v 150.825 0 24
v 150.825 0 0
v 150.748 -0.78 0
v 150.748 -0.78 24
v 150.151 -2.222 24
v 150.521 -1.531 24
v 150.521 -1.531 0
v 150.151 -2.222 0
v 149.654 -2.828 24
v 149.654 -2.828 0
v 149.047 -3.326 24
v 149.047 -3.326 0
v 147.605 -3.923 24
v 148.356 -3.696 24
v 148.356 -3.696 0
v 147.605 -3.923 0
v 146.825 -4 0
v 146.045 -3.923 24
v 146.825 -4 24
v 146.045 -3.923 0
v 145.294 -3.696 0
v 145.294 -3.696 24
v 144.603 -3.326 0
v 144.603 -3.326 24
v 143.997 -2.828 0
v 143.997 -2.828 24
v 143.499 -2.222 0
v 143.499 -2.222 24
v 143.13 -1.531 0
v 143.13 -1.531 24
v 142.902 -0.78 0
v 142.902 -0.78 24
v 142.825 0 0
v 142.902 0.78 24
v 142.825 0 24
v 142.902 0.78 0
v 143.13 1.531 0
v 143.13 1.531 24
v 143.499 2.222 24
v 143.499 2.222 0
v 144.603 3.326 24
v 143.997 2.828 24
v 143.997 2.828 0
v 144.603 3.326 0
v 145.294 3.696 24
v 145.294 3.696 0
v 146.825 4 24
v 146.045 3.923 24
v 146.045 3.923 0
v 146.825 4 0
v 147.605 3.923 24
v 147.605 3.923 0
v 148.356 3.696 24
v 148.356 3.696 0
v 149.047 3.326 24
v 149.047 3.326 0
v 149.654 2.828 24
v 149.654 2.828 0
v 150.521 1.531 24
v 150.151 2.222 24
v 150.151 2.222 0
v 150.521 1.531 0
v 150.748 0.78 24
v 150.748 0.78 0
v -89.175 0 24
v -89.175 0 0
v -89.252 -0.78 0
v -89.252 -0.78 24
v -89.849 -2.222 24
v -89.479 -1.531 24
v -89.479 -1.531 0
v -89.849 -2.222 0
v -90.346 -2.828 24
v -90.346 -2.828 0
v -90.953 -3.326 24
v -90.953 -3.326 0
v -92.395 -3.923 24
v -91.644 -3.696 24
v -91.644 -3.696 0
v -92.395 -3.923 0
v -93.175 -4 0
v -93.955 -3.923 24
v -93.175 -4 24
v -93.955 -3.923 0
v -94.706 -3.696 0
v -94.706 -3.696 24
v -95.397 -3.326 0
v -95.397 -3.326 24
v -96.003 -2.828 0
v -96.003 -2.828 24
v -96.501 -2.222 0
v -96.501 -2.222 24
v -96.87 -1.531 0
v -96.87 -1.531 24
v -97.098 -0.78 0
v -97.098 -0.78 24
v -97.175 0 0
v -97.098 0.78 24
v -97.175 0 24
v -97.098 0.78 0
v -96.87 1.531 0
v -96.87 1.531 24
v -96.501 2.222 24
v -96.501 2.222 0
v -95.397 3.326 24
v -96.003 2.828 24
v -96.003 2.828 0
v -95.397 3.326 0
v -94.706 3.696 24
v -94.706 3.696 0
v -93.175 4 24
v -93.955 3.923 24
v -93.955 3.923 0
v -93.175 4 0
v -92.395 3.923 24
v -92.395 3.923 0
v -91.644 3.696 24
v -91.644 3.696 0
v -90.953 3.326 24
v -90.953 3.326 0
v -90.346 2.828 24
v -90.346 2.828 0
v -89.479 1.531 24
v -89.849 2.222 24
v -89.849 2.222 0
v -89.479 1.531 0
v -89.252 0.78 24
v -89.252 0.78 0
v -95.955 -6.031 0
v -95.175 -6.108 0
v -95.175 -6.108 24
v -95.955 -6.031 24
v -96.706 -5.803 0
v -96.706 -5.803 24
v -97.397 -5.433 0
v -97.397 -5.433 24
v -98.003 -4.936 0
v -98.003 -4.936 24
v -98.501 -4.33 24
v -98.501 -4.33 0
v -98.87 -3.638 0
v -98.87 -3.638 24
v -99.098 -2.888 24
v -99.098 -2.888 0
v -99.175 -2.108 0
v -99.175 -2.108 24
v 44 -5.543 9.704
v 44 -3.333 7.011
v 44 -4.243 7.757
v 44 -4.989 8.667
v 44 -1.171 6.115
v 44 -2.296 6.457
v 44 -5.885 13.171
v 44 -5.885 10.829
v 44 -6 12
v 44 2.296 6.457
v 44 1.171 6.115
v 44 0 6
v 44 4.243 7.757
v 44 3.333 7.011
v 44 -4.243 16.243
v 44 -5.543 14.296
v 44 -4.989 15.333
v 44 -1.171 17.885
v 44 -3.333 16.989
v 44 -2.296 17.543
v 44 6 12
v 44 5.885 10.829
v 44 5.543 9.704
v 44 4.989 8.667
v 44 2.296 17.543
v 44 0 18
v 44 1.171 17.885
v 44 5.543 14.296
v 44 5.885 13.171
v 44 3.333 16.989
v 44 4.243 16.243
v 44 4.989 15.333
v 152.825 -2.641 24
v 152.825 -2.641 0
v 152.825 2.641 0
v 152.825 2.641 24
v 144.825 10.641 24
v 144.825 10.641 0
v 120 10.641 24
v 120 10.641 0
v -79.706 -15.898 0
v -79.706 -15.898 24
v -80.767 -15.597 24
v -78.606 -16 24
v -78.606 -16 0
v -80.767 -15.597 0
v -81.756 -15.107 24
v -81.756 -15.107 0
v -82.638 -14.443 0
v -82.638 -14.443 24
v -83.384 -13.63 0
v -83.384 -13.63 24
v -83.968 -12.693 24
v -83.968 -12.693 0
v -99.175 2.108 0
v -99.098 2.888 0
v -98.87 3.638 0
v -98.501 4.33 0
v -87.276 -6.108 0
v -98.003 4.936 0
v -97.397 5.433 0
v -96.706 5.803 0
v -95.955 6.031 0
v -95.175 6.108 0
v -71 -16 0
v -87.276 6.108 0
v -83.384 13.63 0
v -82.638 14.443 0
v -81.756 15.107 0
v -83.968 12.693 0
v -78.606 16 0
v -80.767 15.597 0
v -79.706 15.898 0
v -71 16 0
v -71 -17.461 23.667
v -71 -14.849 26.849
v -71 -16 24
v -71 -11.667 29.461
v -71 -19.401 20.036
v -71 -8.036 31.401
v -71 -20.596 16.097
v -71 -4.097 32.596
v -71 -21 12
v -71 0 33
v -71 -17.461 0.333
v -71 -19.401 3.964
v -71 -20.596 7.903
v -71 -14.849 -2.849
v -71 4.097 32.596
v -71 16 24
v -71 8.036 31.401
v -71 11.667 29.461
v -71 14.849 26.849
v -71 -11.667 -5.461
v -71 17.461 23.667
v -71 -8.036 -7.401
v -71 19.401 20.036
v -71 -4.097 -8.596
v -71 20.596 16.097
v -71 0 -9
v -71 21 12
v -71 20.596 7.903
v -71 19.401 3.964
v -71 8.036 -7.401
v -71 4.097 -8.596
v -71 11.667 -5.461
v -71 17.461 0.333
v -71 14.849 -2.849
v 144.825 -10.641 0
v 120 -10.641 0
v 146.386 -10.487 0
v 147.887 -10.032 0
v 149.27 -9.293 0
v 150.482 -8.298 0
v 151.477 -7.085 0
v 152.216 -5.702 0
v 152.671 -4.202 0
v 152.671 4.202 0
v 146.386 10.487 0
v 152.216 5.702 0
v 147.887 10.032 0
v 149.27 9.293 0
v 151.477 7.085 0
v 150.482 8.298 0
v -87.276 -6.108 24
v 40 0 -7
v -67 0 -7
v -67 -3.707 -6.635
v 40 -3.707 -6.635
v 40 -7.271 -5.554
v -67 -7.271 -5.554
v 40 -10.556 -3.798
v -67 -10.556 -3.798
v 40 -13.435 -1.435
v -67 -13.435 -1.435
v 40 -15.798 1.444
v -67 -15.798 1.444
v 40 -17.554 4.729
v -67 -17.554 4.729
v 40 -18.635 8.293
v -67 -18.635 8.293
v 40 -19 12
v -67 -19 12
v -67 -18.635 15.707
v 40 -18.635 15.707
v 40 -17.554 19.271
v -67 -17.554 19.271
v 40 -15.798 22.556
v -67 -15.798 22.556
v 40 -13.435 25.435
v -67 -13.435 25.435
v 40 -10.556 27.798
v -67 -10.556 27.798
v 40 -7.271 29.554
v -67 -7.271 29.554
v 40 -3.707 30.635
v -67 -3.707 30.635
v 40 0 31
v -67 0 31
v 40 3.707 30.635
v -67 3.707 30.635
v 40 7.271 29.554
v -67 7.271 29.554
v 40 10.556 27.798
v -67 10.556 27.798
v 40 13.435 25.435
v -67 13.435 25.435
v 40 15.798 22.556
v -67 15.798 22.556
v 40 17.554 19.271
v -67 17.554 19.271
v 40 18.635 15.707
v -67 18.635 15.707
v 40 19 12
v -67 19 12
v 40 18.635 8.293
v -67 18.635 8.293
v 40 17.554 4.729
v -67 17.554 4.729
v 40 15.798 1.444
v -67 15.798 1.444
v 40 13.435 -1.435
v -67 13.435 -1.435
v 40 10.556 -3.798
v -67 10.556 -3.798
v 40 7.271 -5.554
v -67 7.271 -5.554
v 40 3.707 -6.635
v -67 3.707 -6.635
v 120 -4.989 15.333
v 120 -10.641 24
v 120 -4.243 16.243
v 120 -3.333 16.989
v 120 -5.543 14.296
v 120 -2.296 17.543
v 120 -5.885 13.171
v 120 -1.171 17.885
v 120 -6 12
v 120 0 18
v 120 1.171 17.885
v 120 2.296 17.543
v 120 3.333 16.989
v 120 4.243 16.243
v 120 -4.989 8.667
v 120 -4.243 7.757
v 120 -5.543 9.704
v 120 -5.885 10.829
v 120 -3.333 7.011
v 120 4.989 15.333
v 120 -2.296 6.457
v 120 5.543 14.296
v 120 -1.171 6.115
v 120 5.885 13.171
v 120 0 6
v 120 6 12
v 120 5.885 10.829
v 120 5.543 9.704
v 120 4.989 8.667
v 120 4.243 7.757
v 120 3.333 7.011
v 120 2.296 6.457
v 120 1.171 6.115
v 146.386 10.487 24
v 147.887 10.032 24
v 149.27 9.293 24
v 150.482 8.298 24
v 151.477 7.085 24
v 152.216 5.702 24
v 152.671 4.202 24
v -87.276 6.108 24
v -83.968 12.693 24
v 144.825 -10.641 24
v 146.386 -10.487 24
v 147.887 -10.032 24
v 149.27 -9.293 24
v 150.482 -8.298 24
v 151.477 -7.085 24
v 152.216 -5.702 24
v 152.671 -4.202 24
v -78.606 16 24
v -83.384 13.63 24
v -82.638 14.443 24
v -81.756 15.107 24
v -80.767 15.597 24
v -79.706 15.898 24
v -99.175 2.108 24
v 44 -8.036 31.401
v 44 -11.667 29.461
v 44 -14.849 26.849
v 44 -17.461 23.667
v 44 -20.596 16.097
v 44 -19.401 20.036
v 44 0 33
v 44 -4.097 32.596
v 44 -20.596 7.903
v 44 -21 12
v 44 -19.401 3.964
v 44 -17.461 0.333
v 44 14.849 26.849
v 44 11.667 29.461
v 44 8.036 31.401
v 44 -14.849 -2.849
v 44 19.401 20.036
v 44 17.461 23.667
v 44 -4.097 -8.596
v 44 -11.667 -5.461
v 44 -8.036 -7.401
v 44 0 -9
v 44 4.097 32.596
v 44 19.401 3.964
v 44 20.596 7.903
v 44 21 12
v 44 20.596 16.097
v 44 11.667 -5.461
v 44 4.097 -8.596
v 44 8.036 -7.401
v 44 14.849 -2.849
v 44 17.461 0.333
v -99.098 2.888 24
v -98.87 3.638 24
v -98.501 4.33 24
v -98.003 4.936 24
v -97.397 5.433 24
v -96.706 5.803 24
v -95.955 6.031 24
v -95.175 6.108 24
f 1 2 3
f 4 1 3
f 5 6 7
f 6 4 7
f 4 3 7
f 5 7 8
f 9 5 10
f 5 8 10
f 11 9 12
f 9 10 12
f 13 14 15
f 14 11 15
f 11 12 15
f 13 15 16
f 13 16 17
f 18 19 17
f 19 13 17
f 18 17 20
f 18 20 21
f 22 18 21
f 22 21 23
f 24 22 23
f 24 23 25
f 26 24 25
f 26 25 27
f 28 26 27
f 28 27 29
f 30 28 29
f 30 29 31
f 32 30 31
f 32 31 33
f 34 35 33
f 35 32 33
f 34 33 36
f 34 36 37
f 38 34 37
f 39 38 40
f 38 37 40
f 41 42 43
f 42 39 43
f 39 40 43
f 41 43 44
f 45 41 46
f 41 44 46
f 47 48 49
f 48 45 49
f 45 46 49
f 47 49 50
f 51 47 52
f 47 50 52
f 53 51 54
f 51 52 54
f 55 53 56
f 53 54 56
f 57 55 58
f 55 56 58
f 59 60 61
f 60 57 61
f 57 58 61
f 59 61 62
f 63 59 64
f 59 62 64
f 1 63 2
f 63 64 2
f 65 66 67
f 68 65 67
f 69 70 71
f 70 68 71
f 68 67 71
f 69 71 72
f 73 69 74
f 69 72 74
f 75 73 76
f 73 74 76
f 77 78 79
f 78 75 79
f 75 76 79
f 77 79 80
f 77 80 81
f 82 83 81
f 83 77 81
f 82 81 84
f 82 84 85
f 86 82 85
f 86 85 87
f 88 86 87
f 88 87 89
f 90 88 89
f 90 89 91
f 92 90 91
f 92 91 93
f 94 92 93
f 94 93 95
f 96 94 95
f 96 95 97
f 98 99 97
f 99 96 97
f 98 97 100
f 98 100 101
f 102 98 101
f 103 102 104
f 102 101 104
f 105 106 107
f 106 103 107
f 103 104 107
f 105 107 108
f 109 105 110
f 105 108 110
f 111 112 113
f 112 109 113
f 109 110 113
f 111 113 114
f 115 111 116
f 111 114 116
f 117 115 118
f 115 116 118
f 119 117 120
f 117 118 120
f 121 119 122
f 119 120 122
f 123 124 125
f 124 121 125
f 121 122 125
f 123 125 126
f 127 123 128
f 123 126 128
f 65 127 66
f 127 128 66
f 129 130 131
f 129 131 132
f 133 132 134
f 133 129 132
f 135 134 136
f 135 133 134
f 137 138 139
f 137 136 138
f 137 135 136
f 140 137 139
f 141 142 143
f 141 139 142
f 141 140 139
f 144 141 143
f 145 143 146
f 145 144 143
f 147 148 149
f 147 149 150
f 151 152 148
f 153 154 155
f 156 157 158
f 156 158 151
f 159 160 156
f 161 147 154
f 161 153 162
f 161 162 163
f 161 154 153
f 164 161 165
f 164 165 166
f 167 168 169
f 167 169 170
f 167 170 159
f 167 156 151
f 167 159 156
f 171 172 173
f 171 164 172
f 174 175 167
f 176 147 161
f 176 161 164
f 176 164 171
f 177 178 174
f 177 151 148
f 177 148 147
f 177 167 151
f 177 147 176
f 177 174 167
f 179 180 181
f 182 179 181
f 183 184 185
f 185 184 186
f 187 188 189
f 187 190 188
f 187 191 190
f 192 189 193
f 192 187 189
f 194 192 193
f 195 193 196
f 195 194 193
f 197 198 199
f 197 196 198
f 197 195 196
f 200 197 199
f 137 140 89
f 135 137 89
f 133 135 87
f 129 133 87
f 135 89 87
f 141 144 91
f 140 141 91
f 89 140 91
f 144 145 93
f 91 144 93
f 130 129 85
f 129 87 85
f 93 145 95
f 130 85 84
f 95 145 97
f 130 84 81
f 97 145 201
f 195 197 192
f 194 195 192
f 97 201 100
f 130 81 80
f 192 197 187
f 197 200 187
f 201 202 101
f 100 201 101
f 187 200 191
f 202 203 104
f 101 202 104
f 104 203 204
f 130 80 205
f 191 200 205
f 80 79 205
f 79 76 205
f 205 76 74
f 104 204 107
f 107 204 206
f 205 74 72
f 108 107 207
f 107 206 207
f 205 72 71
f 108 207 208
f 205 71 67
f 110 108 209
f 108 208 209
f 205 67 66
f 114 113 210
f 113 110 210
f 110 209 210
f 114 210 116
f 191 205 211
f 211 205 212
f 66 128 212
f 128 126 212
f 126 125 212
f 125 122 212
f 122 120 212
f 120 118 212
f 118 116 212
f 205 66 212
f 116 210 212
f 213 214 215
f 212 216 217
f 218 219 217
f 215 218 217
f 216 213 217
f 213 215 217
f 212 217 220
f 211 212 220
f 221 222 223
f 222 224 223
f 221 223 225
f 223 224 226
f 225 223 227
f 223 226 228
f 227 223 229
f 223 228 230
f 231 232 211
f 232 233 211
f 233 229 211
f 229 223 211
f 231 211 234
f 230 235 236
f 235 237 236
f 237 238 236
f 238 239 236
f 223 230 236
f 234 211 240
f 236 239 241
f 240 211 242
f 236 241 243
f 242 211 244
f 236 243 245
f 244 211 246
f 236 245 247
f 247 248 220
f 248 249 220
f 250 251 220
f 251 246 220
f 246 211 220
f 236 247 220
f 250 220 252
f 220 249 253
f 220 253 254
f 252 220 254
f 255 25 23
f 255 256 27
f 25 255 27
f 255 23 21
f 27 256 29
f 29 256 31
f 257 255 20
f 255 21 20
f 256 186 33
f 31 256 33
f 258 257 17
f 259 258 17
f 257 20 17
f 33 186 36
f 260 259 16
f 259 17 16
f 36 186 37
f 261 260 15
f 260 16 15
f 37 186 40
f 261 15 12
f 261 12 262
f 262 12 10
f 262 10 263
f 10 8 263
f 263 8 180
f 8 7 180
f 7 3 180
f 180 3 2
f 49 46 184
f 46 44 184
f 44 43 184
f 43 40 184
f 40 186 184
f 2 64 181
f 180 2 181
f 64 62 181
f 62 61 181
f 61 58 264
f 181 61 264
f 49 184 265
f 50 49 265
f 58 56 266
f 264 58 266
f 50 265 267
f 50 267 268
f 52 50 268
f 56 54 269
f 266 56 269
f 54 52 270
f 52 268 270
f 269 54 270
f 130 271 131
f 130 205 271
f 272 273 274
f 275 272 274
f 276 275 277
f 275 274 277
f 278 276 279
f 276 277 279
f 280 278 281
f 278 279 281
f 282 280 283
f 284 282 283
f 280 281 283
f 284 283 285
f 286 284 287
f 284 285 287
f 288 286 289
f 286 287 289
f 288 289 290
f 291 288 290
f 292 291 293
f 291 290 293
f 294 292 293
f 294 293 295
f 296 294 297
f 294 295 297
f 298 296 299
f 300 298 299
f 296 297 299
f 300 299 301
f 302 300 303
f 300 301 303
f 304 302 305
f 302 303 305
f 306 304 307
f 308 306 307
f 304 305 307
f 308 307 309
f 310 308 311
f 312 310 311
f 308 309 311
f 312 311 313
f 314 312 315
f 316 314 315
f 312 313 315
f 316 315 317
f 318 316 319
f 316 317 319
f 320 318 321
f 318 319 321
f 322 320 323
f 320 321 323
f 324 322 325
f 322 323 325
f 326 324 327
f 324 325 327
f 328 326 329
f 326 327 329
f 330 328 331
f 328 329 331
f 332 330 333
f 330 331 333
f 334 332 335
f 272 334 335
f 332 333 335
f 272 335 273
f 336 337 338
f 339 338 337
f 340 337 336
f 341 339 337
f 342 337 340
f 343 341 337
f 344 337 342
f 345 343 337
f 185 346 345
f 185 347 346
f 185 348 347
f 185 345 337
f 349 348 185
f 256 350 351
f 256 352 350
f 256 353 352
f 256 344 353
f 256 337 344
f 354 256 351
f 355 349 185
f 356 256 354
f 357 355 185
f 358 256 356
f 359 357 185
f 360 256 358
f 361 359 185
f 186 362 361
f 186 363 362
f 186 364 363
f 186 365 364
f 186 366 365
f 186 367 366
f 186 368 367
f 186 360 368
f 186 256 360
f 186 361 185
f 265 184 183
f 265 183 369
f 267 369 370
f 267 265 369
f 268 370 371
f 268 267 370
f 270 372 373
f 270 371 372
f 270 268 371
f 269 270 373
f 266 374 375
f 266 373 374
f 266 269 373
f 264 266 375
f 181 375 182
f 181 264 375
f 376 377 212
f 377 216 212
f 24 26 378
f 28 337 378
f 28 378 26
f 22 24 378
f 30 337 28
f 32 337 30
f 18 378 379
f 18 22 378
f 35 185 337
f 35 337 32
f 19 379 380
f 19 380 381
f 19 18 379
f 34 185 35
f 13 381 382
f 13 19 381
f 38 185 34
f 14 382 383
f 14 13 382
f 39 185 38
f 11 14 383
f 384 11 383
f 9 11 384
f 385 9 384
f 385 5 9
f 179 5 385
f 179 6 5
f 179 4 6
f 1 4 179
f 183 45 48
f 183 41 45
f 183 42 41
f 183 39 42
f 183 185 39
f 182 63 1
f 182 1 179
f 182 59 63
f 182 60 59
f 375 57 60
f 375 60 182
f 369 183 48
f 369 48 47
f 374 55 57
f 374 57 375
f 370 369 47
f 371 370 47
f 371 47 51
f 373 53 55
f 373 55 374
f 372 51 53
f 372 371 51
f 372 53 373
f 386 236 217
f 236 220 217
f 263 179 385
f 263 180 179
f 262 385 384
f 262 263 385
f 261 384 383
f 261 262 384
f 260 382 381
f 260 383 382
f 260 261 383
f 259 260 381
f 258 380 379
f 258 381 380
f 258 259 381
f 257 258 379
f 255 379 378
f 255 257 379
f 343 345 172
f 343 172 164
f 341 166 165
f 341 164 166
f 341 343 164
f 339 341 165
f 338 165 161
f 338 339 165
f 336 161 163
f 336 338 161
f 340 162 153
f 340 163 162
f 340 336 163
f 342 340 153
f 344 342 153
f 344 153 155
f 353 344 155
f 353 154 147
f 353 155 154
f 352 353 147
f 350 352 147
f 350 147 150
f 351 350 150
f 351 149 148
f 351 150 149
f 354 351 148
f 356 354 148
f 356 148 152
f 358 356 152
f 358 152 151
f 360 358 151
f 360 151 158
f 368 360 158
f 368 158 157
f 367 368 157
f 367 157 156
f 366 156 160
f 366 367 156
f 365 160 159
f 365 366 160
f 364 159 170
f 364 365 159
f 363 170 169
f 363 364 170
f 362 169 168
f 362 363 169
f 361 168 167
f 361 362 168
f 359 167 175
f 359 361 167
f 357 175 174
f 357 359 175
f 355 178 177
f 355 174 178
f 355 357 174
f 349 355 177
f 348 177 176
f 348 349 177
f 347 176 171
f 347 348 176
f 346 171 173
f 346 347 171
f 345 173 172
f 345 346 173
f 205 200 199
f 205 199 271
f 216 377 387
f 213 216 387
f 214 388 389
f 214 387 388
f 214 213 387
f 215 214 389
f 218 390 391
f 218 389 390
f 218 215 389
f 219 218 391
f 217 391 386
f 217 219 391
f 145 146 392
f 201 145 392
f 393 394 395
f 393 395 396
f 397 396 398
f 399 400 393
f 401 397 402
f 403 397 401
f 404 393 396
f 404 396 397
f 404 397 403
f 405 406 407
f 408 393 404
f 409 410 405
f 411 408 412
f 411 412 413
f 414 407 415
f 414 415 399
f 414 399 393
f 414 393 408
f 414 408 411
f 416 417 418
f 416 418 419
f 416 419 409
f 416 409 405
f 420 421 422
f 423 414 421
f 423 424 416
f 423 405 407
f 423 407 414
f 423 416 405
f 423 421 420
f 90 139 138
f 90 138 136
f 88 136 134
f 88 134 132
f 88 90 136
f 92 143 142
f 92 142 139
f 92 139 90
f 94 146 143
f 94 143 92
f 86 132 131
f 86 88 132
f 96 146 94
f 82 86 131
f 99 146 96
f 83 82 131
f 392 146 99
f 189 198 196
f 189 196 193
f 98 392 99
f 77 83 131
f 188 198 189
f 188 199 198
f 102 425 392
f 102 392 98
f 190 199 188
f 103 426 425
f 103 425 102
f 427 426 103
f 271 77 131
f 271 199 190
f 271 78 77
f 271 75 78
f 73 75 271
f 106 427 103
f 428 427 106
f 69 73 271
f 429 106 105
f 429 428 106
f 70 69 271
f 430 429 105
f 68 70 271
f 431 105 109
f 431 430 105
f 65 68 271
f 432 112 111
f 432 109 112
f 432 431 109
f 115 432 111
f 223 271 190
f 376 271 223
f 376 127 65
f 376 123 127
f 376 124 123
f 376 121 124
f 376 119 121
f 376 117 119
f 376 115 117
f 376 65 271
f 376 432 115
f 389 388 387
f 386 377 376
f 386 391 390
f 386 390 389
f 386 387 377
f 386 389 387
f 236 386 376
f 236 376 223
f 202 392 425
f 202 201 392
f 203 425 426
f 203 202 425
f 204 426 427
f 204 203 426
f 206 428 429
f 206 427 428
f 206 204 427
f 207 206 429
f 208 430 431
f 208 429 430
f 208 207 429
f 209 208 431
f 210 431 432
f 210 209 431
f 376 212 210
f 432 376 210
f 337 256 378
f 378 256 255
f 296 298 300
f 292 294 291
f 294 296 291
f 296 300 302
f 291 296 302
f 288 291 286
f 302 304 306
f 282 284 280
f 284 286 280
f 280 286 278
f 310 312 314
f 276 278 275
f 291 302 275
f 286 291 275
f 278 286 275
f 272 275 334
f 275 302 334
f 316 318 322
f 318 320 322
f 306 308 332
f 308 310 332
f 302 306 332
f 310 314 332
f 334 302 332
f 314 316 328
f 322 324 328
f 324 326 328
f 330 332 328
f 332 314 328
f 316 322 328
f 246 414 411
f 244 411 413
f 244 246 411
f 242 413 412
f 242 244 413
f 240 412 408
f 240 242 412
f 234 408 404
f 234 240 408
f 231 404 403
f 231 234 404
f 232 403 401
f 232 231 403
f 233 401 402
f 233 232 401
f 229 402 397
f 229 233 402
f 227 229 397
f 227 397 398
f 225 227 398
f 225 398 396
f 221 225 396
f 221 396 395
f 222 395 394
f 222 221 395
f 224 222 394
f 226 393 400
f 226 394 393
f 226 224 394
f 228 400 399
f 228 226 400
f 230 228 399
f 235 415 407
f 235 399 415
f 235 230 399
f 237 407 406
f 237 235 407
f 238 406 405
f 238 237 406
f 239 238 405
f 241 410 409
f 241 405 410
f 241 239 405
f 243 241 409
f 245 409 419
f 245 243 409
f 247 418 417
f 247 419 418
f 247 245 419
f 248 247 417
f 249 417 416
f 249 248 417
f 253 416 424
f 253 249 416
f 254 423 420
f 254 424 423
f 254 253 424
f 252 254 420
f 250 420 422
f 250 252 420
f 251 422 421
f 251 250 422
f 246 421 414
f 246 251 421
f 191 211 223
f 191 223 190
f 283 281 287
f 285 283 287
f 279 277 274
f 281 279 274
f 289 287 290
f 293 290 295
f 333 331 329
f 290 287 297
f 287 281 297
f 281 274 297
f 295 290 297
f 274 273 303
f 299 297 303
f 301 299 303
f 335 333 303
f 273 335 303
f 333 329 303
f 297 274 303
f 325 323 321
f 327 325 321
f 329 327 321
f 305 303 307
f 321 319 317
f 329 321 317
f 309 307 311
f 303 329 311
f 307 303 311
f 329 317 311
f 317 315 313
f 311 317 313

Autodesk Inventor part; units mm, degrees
ref_plane "YZ Plane" through (0, 0, 0) normal (1, 0, 0) x (0, 1, 0)
ref_plane "XZ Plane" through (0, 0, 0) normal (0, 1, 0) x (-1, 0, 0)
ref_plane "XY Plane" through (0, 0, 0) normal (0, 0, 1) x (1, 0, 0)
sketch "Sketch12" plane through (0, 0, 0) normal (0, 0, 1) x (1, 0, 0)
  line L0 (120.2458, -10.6408) -> (144.8251, -10.6408)
  line L1 (152.8251, -2.6408) -> (152.8251, 2.6408)
  line L2 (144.8251, 10.6408) -> (120.2458, 10.6408)
  arc A0 (144.8251, -10.6408) -> (152.8251, -2.6408) centre (144.8251, -2.6408) ccw
  arc A1 (152.8251, 2.6408) -> (144.8251, 10.6408) centre (144.8251, 2.6408) ccw
  circle A2 centre (146.8251, 0) radius 4
  circle A3 centre (-93.1749, 0) radius 4 construction
  line L3 (120.2458, -10.6408) -> (120.2458, 10.6408)
  line L4 (-83.9681, -12.6932) -> (-87.2761, -6.1075)
  line L5 (-87.2761, -6.1075) -> (-95.1749, -6.1075)
  line L6 (-87.2761, 6.1075) -> (-95.1749, 6.1075)
  circle A4 centre (-93.1749, 0) radius 4
  arc A5 (-95.1749, 6.1075) -> (-99.1749, 2.1075) centre (-95.1749, 2.1075) ccw
  line L7 (-99.1749, 2.1075) -> (-99.1749, 0)
  arc A6 (-99.1749, -2.1075) -> (-95.1749, -6.1075) centre (-95.1749, -2.1075) ccw
  line L8 (-99.1749, -2.1075) -> (-99.1749, 0)
  arc A7 (-83.9681, -12.6932) -> (-78.6065, -16) centre (-78.6065, -10) ccw
  line L9 (-71, -16) -> (-78.6065, -16)
  line L10 (-71, 0) -> (-71, -16)
  line L11 (-71, 20) -> (-71, -20)
  line L12 (-83.9681, 12.6932) -> (-87.2761, 6.1075)
  line L13 (-71, 0) -> (-71, 16)
  line L14 (-71, 16) -> (-78.6065, 16)
  arc A8 (-78.6065, 16) -> (-83.9681, 12.6932) centre (-78.6065, 10) ccw
  point P0 (0, 0)
  dimension "d44" = 8
  dimension "d45" = 8
  dimension "d46" = 240
  dimension "d47" = 6
  dimension "d48" = 6
  dimension "d49" = 16
  dimension "d50" = 4
  dimension "d51" = 8
  dimension "d52" = 6
extrude "Extrusion14" add sketch "Sketch12" along normal blind 24 contours L4 L5 A6 L8 L7 A5 L6 L12 A8 L14 L11 L10 L9 A7
sketch "Sketch14" plane through (-71, -16, 0) normal (1, 0, 0) x (0, 0, -1)
  line L0 (0, 0) -> (-24, 0) projected
  line L1 (-24, 12) -> (-24, 20) projected
  circle A0 centre (-12, 16) radius 19
  circle A1 centre (-12, 16) radius 21
  point P0 (0, 16)
  dimension "d58" = 38
  dimension "d59" = 2
extrude "Extrusion16" add sketch "Sketch14" along normal blind 115
sketch "Sketch15" plane through (-71, 0, 12) normal (-1, 0, 0) x (0, 0, 1)
  circle A0 centre (0, 0) radius 21 projected
  point P0 (-12, 0)
extrude "Extrusion17" add sketch "Sketch15" against normal blind 4
sketch "Sketch16" plane through (44, 0, 12) normal (1, 0, 0) x (0, 0, -1)
  circle A0 centre (0, 0) radius 21 projected
  point P0 (12, 0)
extrude "Extrusion18" add sketch "Sketch16" against normal blind 4
sketch "Sketch17" plane through (0, 0, 0) normal (0, 0, 1) x (1, 0, 0)
  line L0 (120, -10.6408) -> (144.8251, -10.6408)
  line L1 (152.8251, -2.6408) -> (152.8251, 2.6408)
  line L2 (144.8251, 10.6408) -> (120, 10.6408)
  arc A0 (144.8251, -10.6408) -> (152.8251, -2.6408) centre (144.8251, -2.6408) ccw
  arc A1 (152.8251, 2.6408) -> (144.8251, 10.6408) centre (144.8251, 2.6408) ccw
  circle A2 centre (146.8251, 0) radius 4
  line L3 (120, -10.6408) -> (120, 10.6408)
  line L4 (44, -21) -> (44, 21) projected
  point P0 (0, 0)
  point P1 (0, 0)
  dimension "d68" = 8
  dimension "d69" = 8
  dimension "d71" = 6
  dimension "d77" = 76
extrude "Extrusion20" add sketch "Sketch17" along normal blind 24 separate body
sketch "Sketch18" plane through (120, -10.6408, 0) normal (-1, 0, 0) x (0, 0, 1)
  line L0 (0, 0) -> (24, 0) projected
  circle A0 centre (12, 10.6408) radius 6
  point P0 (0, 10.6408)
  point P1 (0, 12.7482)
  dimension "d80" = 12
extrude "Extrusion21" add sketch "Sketch18" along normal up to surface (76 mm away) bodies 2
properties part number "amortiguador"
